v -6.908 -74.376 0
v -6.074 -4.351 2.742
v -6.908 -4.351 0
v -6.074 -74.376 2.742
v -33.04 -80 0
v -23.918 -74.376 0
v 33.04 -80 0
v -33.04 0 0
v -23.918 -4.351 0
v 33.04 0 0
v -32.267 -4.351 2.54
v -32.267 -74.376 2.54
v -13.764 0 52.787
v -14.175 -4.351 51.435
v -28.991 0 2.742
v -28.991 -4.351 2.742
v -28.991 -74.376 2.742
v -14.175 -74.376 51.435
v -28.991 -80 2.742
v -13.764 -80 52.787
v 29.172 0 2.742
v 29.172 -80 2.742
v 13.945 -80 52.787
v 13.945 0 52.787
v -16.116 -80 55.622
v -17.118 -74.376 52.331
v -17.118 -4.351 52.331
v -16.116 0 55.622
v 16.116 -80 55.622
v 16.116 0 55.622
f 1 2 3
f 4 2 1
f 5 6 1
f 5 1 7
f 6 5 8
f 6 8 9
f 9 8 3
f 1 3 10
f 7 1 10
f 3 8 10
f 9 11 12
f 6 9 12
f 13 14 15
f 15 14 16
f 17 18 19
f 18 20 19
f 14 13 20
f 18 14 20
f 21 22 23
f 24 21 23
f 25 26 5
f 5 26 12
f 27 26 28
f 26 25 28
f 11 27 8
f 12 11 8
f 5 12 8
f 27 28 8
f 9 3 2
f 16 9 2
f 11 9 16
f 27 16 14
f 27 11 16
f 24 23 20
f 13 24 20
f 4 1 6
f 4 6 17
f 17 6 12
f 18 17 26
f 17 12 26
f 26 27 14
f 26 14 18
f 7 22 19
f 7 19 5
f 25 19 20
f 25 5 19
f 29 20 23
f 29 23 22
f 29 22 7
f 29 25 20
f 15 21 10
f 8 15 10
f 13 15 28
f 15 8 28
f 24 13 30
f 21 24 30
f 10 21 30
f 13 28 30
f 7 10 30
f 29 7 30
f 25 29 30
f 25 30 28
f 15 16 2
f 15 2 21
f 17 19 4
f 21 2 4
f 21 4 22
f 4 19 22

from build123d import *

# Parameters (mm, degrees)
F1_DEPTH = 80
F3_DEPTH = 80
F4_W     = 70.0248382054
F4_H     = 52.043965552
F5_DEPTH = 25


with BuildPart() as f1:
    # F0 (on Front) → F1 (new body)
    with BuildSketch(Plane.XZ):
        Polygon((-16.1164440215, 55.6217506528), (-33.0398865044, 0), (0, 0), (0, 55.6217506528), align=None)
        Polygon((0, 55.6217506528), (0, 0), (33.0398865044, 0), (16.1164440215, 55.6217506528), align=None)
    extrude(amount=F1_DEPTH)

    # F2 (on face) → F3 (cut)
    with BuildSketch(Plane.XZ.offset(80)):
        Polygon((-13.7641547164, 52.7867953574), (-28.990626716, 2.7424246723), (29.1717245215, 2.7424246723), (13.9452525218, 52.7867953574), align=None)
    extrude(amount=-F3_DEPTH, mode=Mode.SUBTRACT)

    # F4 (on face) → F5 (cut)
    with BuildSketch(Plane(origin=(-30.2404161362, 0, 9.200931958), x_dir=(0, -1, 0), z_dir=(-0.9566974319, 0, 0.2910842211))):
        with Locations((39.3633369822, 19.0598971676)):
            Rectangle(F4_W, F4_H)
    extrude(amount=-F5_DEPTH, mode=Mode.SUBTRACT)


solid = f1.part
